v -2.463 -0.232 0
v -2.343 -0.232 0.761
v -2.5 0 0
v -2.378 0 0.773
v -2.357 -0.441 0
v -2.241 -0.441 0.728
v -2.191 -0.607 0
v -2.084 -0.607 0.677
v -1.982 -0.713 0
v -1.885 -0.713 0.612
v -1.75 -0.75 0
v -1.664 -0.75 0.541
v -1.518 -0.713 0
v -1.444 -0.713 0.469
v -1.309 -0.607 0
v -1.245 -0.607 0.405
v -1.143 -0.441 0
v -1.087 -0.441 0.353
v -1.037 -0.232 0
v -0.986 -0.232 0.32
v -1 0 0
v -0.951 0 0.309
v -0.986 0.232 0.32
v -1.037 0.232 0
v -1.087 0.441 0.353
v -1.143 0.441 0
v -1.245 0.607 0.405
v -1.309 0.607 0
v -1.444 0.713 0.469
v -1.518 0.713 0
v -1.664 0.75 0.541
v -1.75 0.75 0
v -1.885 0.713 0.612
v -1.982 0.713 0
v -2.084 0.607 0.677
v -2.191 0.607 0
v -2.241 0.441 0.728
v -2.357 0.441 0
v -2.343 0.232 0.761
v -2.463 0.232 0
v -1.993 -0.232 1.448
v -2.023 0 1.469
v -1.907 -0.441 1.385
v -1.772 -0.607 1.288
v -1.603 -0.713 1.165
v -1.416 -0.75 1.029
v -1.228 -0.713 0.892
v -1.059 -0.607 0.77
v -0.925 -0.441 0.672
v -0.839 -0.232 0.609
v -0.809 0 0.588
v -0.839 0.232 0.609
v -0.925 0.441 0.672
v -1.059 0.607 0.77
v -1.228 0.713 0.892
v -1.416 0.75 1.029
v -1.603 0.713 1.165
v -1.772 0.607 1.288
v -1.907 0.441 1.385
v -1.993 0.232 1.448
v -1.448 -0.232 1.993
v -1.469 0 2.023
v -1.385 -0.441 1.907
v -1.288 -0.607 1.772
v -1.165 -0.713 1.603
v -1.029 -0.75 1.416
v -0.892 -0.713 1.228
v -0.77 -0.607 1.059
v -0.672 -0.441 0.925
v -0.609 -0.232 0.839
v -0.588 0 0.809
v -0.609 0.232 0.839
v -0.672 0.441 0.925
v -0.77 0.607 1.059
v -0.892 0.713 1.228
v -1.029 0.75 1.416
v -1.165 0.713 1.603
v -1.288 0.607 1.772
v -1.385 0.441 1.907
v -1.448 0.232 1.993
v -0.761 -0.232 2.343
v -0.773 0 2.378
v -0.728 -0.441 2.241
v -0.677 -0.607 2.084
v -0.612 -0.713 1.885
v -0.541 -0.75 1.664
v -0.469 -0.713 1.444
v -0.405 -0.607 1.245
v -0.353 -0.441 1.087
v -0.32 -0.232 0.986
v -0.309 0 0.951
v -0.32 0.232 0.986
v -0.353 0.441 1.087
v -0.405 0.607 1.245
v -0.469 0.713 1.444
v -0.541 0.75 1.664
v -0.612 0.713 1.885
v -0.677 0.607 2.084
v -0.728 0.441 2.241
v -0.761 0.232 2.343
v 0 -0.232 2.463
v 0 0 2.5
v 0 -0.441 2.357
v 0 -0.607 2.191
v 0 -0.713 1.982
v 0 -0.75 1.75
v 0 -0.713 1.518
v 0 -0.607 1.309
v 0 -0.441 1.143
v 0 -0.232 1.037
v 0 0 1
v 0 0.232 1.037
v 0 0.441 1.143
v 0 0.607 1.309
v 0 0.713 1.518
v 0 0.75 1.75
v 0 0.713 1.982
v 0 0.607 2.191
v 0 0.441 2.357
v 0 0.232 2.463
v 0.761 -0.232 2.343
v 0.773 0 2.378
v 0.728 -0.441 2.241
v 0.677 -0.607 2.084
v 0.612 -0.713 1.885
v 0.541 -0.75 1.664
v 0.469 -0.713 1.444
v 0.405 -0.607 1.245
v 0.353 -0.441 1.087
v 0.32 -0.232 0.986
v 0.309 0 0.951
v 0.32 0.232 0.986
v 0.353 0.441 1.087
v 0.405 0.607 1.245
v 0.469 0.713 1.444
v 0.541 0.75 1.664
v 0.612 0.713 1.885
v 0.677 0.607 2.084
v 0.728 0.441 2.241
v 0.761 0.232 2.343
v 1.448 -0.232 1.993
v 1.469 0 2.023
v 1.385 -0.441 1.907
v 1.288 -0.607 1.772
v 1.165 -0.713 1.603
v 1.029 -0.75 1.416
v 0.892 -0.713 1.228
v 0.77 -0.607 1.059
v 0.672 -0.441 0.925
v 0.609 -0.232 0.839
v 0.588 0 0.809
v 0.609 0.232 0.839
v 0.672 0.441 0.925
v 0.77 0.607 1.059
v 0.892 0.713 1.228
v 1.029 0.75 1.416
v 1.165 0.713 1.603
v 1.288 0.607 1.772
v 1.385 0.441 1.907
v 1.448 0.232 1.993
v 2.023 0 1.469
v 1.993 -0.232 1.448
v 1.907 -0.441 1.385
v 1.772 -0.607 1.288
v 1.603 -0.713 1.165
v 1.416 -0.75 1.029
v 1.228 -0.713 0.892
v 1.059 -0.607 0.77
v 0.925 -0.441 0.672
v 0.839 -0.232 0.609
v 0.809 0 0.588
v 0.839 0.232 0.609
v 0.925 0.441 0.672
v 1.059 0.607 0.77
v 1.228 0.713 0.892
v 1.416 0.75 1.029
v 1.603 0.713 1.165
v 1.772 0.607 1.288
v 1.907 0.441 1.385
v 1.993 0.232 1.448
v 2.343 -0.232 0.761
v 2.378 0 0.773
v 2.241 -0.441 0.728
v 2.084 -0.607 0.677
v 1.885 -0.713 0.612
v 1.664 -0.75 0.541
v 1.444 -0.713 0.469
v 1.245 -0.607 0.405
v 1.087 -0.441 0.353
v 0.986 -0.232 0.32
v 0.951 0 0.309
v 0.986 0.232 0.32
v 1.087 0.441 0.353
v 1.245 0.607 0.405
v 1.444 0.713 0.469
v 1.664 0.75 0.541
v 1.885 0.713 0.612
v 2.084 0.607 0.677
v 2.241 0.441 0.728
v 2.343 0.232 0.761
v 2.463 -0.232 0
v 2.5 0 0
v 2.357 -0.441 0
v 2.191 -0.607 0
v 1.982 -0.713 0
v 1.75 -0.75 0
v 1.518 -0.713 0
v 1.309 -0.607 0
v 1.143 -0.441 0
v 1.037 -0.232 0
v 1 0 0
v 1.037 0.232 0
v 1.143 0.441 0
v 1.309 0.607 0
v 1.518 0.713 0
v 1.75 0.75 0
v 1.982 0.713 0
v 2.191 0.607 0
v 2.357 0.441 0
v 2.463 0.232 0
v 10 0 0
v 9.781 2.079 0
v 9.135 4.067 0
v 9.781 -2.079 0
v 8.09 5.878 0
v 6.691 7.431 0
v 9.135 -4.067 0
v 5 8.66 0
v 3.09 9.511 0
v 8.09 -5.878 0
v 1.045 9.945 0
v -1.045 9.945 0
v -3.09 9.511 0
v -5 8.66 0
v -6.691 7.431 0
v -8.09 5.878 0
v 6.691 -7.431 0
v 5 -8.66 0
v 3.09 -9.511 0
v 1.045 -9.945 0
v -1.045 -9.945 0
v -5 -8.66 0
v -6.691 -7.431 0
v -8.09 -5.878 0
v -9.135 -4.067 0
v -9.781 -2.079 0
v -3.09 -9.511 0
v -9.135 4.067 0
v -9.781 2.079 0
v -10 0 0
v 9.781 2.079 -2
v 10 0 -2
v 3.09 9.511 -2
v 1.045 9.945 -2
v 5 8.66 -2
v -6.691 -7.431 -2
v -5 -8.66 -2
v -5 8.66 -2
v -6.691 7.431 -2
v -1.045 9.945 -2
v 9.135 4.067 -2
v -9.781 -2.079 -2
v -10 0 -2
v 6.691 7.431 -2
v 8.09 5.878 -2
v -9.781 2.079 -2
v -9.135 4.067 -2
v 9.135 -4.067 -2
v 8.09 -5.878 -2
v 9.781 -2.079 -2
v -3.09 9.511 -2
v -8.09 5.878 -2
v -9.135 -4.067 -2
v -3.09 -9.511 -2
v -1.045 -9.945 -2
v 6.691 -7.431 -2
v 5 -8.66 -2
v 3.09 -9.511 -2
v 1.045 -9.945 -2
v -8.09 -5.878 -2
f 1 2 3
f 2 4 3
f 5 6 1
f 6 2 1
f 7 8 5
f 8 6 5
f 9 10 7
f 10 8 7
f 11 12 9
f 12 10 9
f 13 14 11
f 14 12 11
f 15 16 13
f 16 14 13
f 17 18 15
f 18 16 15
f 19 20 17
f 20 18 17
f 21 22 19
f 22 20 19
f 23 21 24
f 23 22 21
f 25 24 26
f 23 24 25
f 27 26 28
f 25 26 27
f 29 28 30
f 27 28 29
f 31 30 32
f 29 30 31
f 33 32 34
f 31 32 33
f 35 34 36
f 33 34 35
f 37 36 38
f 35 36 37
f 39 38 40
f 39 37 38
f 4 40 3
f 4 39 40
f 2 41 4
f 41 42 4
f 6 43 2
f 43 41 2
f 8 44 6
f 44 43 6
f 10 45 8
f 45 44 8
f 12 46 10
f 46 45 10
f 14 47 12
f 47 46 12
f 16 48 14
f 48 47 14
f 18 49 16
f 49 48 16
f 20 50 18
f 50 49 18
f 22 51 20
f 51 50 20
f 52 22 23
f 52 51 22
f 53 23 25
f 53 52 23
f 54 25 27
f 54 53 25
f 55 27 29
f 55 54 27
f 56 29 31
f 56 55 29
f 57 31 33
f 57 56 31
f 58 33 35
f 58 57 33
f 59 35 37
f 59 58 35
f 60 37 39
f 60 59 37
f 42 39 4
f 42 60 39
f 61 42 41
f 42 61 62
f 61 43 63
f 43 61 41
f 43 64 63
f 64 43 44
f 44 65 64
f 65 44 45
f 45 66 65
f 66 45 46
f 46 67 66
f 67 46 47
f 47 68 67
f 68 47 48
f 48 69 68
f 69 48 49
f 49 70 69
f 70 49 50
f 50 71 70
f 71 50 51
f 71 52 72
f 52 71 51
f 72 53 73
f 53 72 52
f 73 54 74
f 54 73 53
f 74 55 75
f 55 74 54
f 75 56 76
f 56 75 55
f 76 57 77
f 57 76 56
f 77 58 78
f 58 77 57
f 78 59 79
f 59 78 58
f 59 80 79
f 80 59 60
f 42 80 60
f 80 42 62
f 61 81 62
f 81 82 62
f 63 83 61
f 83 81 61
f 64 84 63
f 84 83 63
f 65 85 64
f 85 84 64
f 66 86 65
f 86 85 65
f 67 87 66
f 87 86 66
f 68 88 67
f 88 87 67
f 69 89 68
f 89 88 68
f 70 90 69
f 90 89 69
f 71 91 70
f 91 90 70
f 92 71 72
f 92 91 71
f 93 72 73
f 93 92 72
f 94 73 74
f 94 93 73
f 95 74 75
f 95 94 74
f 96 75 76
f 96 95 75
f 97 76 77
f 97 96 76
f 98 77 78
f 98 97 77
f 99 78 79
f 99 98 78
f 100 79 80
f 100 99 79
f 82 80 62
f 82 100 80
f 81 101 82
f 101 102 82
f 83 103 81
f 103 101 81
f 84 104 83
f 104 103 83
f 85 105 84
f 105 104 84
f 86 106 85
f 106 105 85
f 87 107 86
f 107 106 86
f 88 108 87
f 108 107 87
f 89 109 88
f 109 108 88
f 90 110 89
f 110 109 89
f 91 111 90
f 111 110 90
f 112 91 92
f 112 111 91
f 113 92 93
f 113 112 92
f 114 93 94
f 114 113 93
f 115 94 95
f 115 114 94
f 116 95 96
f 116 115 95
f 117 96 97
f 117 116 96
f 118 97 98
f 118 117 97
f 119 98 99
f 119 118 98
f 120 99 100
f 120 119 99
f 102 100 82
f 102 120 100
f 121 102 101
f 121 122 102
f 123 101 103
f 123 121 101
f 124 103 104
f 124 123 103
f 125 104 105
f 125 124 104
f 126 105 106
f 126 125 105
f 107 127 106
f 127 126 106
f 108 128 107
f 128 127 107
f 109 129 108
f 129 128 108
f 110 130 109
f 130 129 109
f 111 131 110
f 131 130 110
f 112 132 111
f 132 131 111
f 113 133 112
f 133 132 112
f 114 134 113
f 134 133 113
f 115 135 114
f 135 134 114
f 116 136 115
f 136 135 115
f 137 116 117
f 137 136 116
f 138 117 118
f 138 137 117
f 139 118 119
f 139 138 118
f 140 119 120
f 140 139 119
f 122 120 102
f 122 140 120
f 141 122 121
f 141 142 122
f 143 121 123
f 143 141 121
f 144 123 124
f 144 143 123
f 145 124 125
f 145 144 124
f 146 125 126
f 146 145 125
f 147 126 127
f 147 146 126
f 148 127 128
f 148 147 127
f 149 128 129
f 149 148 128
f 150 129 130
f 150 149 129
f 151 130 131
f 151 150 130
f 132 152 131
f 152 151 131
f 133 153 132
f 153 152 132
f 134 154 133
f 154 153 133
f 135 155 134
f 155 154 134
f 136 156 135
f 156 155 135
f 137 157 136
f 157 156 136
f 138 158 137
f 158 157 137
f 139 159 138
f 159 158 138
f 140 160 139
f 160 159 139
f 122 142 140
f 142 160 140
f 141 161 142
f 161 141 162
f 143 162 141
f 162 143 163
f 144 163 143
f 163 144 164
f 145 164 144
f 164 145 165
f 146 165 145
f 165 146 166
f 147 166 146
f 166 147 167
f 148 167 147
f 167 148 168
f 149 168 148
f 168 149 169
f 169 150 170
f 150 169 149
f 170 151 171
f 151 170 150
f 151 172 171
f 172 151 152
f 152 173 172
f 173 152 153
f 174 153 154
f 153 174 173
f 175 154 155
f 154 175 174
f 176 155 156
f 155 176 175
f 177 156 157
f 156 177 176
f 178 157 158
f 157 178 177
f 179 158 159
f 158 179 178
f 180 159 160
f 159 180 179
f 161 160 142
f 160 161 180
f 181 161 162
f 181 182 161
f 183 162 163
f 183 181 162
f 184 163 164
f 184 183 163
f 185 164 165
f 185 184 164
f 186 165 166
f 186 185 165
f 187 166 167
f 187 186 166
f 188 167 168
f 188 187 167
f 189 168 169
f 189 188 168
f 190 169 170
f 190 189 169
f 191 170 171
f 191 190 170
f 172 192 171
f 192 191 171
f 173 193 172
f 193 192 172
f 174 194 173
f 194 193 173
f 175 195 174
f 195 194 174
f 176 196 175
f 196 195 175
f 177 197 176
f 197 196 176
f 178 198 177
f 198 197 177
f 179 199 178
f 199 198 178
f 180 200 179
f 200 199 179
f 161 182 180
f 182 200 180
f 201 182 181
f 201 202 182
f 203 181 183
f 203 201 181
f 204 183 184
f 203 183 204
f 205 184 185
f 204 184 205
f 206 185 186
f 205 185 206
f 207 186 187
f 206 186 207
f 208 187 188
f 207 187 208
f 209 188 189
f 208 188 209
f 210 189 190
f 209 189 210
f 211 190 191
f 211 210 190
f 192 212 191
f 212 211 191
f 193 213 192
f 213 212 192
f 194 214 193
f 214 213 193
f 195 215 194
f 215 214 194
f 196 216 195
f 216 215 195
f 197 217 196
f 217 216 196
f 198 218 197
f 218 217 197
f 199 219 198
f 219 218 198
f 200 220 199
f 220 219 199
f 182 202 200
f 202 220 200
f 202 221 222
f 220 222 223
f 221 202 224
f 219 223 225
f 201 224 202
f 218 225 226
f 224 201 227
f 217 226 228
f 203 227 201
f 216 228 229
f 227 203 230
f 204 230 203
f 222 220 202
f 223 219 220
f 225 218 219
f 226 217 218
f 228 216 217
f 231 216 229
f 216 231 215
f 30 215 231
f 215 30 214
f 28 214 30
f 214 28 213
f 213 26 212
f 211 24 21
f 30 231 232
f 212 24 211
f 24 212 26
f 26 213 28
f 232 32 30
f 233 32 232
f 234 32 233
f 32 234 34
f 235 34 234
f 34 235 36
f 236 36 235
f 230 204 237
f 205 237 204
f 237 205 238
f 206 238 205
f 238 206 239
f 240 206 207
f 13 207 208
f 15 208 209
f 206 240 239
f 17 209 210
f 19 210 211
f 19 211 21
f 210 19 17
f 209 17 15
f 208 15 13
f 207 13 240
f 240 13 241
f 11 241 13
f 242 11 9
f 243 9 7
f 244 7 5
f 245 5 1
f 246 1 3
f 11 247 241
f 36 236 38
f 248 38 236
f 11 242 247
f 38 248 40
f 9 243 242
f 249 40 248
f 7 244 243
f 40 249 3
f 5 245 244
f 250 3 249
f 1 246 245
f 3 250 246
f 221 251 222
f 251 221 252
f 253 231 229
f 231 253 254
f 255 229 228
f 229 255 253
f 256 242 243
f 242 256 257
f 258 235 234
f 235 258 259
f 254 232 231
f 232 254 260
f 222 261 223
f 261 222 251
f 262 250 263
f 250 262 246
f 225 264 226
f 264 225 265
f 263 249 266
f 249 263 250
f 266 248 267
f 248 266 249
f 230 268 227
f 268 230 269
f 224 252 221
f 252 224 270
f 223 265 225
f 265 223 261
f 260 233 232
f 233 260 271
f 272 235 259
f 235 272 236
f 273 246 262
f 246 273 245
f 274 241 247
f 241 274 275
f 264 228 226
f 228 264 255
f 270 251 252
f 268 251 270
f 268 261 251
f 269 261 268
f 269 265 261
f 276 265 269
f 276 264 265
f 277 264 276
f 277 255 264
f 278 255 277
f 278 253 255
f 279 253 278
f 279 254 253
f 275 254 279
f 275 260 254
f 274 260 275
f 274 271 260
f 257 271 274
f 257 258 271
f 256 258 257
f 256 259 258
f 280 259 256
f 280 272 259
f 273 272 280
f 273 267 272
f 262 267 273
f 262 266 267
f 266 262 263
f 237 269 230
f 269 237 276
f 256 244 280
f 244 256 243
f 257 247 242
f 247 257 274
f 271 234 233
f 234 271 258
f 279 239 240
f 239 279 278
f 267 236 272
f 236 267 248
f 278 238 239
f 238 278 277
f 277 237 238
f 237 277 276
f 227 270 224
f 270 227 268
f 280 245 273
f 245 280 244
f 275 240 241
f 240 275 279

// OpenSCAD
hookDiameter = 1.5;
hookInnerDiameter = 1;
hookFacets = 20;

baseDiameter = 20;
baseHeight = 2;
baseFacets = 50;

difference(){
    union() {
        rotate(a = [90,0,0])
            rotate_extrude(convexity = 10, $fn = hookFacets)
                translate([hookInnerDiameter + (hookDiameter / 2), 0, 0])
                    circle(d = hookDiameter, $fn = hookFacets);
    }
    
    mirror([0,0,1])
        cylinder(d=baseDiameter,h=(hookDiameter*2)+hookInnerDiameter);
}

mirror([0,0,1])
    cylinder(d=baseDiameter,h=baseHeight);
